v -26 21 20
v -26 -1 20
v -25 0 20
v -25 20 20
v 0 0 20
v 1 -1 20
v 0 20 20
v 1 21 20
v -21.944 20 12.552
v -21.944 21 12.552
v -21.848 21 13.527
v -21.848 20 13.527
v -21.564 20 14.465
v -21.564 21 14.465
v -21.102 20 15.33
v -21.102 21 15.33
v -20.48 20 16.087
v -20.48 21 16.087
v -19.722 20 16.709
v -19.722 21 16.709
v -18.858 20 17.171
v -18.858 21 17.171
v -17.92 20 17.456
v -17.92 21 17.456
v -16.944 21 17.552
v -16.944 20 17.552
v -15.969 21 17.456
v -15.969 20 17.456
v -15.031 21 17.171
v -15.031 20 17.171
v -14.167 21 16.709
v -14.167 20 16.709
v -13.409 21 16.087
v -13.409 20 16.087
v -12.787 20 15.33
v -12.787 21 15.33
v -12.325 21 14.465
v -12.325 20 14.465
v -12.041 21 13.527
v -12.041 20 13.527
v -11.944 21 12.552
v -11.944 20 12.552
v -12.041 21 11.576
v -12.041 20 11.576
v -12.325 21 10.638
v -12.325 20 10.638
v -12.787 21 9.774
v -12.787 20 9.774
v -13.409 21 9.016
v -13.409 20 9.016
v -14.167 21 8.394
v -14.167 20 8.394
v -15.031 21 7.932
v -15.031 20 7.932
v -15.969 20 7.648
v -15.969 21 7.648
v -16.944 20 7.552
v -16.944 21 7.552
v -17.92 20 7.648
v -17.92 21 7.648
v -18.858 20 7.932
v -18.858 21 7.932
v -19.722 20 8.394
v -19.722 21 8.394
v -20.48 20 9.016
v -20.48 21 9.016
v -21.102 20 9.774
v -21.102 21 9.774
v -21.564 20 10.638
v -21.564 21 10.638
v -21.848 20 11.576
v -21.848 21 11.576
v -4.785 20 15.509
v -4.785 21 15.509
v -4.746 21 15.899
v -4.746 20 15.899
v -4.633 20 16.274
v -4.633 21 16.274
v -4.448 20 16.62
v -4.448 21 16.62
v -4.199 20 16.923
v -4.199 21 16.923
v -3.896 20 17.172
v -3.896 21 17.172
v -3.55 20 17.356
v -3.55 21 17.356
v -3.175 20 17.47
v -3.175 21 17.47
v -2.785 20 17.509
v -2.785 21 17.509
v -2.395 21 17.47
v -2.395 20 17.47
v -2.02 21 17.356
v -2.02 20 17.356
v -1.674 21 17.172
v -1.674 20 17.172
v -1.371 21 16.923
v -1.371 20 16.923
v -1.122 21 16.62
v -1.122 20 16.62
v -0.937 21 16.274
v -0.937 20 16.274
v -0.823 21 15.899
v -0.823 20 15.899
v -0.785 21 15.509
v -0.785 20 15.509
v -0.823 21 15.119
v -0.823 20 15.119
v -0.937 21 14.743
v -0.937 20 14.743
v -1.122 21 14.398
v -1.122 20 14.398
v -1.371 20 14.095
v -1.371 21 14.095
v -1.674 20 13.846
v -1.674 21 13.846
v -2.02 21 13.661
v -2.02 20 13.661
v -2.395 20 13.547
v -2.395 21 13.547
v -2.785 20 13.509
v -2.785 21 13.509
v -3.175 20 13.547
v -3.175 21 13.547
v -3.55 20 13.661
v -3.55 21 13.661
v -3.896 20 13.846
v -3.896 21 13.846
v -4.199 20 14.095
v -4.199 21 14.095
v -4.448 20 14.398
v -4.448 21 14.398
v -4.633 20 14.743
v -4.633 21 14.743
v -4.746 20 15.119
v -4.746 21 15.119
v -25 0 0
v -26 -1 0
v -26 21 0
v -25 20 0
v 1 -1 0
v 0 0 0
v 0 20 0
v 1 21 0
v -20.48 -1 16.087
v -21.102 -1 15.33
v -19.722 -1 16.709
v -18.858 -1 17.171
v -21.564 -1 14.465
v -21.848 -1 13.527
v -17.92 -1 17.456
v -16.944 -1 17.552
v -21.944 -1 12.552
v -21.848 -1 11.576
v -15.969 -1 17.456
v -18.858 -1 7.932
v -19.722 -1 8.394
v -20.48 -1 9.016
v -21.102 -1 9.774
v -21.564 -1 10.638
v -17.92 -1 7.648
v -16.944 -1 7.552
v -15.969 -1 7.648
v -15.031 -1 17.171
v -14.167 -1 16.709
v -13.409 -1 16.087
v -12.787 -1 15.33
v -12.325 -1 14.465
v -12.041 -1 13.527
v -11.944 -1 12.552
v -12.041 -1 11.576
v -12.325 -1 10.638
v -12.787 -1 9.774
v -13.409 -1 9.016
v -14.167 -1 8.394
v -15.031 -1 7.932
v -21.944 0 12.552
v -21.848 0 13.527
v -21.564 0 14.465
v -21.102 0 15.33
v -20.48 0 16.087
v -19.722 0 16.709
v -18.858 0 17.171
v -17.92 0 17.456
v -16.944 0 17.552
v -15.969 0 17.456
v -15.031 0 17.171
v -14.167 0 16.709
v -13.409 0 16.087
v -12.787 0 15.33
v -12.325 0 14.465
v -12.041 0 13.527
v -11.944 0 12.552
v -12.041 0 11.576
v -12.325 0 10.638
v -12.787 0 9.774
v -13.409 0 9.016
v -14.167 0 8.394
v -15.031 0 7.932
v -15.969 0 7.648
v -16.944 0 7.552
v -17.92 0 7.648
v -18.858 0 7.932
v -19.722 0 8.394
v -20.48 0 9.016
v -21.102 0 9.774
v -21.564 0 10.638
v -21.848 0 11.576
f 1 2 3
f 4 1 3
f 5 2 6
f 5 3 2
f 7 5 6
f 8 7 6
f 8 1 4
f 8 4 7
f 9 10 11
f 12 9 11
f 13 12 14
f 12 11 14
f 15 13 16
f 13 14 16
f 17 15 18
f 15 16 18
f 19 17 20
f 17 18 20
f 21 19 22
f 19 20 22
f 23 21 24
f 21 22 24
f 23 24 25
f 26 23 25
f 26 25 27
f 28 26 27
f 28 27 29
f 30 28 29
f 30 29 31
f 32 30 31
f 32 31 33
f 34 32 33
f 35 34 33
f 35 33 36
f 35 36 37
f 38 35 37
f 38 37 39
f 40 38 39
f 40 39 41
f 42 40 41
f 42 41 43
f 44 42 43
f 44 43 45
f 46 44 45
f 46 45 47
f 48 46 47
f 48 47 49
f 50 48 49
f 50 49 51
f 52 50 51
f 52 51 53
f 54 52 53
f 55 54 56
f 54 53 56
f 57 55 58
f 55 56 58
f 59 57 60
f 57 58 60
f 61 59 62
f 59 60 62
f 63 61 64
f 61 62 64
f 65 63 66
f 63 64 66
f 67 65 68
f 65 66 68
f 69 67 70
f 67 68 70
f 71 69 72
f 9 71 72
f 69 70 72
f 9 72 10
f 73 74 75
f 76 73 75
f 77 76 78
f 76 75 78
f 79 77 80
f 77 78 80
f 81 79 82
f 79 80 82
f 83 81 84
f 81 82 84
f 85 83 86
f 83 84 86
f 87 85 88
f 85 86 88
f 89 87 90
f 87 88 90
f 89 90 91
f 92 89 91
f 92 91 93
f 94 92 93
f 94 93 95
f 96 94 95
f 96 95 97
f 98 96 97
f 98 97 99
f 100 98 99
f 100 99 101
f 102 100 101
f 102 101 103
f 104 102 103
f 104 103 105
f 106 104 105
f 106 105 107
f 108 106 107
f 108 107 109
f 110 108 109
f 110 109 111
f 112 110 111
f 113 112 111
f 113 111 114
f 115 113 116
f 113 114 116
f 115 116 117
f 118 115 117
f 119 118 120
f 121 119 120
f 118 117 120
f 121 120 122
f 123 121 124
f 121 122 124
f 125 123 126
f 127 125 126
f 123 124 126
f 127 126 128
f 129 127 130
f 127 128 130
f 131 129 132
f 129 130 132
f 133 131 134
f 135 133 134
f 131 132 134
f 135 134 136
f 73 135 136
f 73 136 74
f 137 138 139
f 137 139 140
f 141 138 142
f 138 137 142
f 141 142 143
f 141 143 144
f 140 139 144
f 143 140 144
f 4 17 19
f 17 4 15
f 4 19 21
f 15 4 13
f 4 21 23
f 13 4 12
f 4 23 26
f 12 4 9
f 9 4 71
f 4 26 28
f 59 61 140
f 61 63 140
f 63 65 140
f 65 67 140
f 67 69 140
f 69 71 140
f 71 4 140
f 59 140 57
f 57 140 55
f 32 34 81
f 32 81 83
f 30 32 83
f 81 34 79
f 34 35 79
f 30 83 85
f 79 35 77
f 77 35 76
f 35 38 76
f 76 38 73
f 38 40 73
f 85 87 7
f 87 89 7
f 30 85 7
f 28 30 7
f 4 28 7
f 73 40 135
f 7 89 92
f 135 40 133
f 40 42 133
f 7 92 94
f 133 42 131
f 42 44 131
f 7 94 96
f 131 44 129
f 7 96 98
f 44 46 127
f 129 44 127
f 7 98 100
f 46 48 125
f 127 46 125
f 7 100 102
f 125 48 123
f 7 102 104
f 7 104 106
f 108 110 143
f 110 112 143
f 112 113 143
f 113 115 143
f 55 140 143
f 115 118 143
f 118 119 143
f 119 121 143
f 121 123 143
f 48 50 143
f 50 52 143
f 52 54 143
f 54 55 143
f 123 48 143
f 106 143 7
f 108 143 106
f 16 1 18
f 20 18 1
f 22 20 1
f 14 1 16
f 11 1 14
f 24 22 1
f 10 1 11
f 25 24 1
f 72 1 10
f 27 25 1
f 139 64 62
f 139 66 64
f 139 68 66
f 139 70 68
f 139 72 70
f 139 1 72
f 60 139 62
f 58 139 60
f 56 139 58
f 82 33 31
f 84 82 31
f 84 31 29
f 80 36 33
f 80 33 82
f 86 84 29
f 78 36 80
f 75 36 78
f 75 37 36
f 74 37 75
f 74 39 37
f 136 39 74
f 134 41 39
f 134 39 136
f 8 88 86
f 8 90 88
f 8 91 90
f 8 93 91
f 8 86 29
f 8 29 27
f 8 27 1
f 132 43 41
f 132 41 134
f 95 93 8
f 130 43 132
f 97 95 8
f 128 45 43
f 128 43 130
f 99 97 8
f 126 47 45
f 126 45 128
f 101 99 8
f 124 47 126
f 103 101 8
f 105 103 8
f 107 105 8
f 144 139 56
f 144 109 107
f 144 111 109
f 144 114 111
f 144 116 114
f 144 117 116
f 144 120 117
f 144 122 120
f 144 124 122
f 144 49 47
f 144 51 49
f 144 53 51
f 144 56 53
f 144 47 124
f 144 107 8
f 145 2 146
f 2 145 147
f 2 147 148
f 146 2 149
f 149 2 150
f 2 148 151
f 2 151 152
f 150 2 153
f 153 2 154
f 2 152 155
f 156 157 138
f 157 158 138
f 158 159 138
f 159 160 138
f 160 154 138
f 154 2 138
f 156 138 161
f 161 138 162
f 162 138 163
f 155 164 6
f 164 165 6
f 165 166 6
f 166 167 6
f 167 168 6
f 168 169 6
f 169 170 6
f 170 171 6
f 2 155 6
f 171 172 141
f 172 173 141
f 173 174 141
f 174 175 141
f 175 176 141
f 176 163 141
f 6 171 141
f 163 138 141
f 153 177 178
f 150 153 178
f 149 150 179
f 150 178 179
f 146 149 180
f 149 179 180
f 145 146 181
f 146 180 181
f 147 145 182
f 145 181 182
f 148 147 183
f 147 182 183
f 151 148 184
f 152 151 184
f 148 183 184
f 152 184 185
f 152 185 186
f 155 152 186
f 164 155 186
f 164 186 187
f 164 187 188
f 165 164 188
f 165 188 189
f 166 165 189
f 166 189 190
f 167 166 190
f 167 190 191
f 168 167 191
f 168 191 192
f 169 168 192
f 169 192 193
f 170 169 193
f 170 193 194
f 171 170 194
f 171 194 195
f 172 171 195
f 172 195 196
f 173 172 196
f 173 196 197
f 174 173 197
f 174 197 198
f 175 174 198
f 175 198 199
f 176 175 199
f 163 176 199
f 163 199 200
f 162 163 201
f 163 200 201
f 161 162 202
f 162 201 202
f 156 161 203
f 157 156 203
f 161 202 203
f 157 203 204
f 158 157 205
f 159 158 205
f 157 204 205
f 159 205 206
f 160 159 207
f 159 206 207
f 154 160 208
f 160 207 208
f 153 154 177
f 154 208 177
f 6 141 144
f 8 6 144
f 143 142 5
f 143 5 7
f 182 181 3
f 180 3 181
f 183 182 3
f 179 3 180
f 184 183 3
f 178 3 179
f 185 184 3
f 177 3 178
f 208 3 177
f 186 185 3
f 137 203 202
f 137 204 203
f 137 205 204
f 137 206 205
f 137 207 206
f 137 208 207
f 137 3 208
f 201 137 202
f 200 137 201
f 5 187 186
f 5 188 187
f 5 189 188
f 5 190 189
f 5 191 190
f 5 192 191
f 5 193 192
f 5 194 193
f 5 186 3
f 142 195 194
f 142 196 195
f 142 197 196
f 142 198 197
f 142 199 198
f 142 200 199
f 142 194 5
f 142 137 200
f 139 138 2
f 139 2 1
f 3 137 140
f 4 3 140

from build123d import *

# Parameters (mm, degrees)
ESBO_O1_W             = 27
ESBO_O1_H             = 22
ESBO_O1_W_2           = 25
ESBO_O1_H_2           = 20
EXTRUS_O_FINA1_DEPTH  = 20
ESBO_O2_R             = 5
CORTE_EXTRUS_O1_DEPTH = 23
ESBO_O3_R             = 2
CORTE_EXTRUS_O2_DEPTH = 10


with BuildPart() as part:
    # Esboço1 → Extrusão-Fina1 (new body)
    with BuildSketch(Plane.XY):
        with Locations((-12.5, 10)):
            Rectangle(ESBO_O1_W, ESBO_O1_H)
        with Locations((-12.5, 10)):
            Rectangle(ESBO_O1_W_2, ESBO_O1_H_2, mode=Mode.SUBTRACT)
    extrude(amount=EXTRUS_O_FINA1_DEPTH)

    # Esboço2 → Corte-extrusão1 (cut, through all)
    with BuildSketch(Plane(origin=(0, 21, 0), x_dir=(1, 0, 0), z_dir=(0, 1, 0))):
        with Locations(Location((-16.944433868, -12.551828058, 0), (0, 0, 180))):  # turned: the seam where the file's is
            Circle(ESBO_O2_R)
    extrude(amount=-CORTE_EXTRUS_O1_DEPTH, mode=Mode.SUBTRACT)

    # Esboço3 → Corte-extrusão2 (cut)
    with BuildSketch(Plane(origin=(0, 21, 0), x_dir=(1, 0, 0), z_dir=(0, 1, 0))):
        with Locations(Location((-2.78489643, -15.508719635, 0), (0, 0, 180))):  # turned: the seam where the file's is
            Circle(ESBO_O3_R)
    extrude(amount=-CORTE_EXTRUS_O2_DEPTH, mode=Mode.SUBTRACT)


solid = part.part
